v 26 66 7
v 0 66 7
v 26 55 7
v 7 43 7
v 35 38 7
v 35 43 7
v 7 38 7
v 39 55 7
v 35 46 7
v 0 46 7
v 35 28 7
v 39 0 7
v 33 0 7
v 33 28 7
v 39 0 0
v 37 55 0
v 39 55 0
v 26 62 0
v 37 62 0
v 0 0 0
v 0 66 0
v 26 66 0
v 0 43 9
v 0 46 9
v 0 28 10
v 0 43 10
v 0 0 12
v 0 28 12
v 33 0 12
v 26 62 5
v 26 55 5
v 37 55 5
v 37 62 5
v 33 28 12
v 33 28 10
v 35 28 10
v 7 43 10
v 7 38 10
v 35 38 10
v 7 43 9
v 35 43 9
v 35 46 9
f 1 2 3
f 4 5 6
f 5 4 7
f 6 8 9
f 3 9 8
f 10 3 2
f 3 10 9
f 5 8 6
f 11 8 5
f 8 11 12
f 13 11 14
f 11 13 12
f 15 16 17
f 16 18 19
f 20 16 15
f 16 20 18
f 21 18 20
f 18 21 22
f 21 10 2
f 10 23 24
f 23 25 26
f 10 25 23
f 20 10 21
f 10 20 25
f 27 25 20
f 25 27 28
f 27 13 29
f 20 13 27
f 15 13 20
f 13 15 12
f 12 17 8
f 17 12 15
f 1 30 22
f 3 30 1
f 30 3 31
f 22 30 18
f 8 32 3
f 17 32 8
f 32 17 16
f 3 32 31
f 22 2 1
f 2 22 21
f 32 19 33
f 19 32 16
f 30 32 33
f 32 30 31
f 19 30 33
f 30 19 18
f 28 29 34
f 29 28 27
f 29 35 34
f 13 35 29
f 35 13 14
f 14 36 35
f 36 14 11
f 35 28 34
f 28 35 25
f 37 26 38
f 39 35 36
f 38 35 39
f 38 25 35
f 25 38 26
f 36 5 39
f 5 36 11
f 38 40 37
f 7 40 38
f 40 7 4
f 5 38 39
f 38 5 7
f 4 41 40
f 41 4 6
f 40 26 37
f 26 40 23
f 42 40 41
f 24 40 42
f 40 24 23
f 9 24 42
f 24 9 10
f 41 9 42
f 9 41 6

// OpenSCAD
translate([6.5, 5.5, 3.5]) color([0.13558077637136434, 0.20650423900368708, 0.9151210693627757]) cube([13, 11, 7], center=true);
translate([19.5, 5.5, 3.5]) color([0.49673738754911745, 0.7672539256192649, 0.969306850533619]) cube([13, 11, 7], center=true);
translate([32.5, 5.5, 3.5]) color([0.23531586477578126, 0.13212860983739783, 0.23368957459901674]) cube([13, 11, 7], center=true);
translate([6.5, 16.5, 3.5]) color([0.38460662479298113, 0.6084990843462054, 0.1325407149567407]) cube([13, 11, 7], center=true);
translate([19.5, 16.5, 3.5]) color([0.4984659545183915, 0.9178662904203972, 0.6160167741323543]) cube([13, 11, 7], center=true);
translate([32.5, 16.5, 3.5]) color([0.02601445858505036, 0.596125612844632, 0.48919913512172475]) cube([13, 11, 7], center=true);
translate([6.5, 27.5, 3.5]) color([0.30869925031539414, 0.9586301909392594, 0.5555224541780607]) cube([13, 11, 7], center=true);
translate([19.5, 27.5, 3.5]) color([0.16303723797834868, 0.8790785483620981, 0.8092366229990562]) cube([13, 11, 7], center=true);
translate([32.5, 27.5, 3.5]) color([0.7373715302416316, 0.5460288399006699, 0.7042240787132147]) cube([13, 11, 7], center=true);
translate([6.5, 38.5, 3.5]) color([0.07877233817546292, 0.13744427713979768, 0.40185422229333856]) cube([13, 11, 7], center=true);
translate([19.5, 38.5, 3.5]) color([0.1910666288561843, 0.31642065037316636, 0.2917281417853558]) cube([13, 11, 7], center=true);
translate([32.5, 38.5, 3.5]) color([0.9437754009602987, 0.20866341172373193, 0.3151573145870893]) cube([13, 11, 7], center=true);
translate([6.5, 49.5, 3.5]) color([0.7470721078045024, 0.24960896628473228, 0.8629627260654799]) cube([13, 11, 7], center=true);
translate([19.5, 49.5, 3.5]) color([0.6684326881602258, 0.6597695027130189, 0.22591717735012307]) cube([13, 11, 7], center=true);
translate([32.5, 49.5, 3.5]) color([0.3441717078654829, 0.16233220178561225, 0.01697652307419406]) cube([13, 11, 7], center=true);
translate([6.5, 60.5, 3.5]) color([0.5735931064152219, 0.05818297514553228, 0.6304378073753134]) cube([13, 11, 7], center=true);
translate([19.5, 60.5, 3.5]) color([0.35341956482818127, 0.49110709598533775, 0.06132304686728618]) cube([13, 11, 7], center=true);
translate([31.5, 58.5, 2.5]) color([0.24146702174069912, 0.012441234482642782, 0.9455344576677447]) cube([11, 7, 5], center=true);
translate([5.5, 3.5, 9.5]) color([0.3266678829978785, 0.820956849026723, 0.34492851027915805]) cube([11, 7, 5], center=true);
translate([16.5, 3.5, 9.5]) color([0.6639756368298299, 0.13585073420724958, 0.9219835342207869]) cube([11, 7, 5], center=true);
translate([27.5, 3.5, 9.5]) color([0.44896684911260887, 0.1420549627992148, 0.3119518323014343]) cube([11, 7, 5], center=true);
translate([5.5, 10.5, 9.5]) color([0.6490756968320398, 0.7280642389267371, 0.7852833252199665]) cube([11, 7, 5], center=true);
translate([16.5, 10.5, 9.5]) color([0.40863068686923587, 0.009633238682779877, 0.8909238596539266]) cube([11, 7, 5], center=true);
translate([27.5, 10.5, 9.5]) color([0.533705581213062, 0.8046005274030336, 0.9806276909012095]) cube([11, 7, 5], center=true);
translate([5.5, 17.5, 9.5]) color([0.7049346898693578, 0.7590860206033218, 0.5647284680717275]) cube([11, 7, 5], center=true);
translate([16.5, 17.5, 9.5]) color([0.12259546226958773, 0.9539533584587191, 0.1713156178825357]) cube([11, 7, 5], center=true);
translate([27.5, 17.5, 9.5]) color([0.5005542720722199, 0.621843985236089, 0.6619765424276485]) cube([11, 7, 5], center=true);
translate([5.5, 24.5, 9.5]) color([0.8400519693824264, 0.699601591737329, 0.07964741684534404]) cube([11, 7, 5], center=true);
translate([16.5, 24.5, 9.5]) color([0.23738047361475634, 0.8282556520451495, 0.1762738246231843]) cube([11, 7, 5], center=true);
translate([27.5, 24.5, 9.5]) color([0.9459581227747745, 0.9565644324307663, 0.8963269305888116]) cube([11, 7, 5], center=true);
translate([3.5, 30.5, 8.5]) color([0.7428117304122551, 0.8383436924491765, 0.5614087817692366]) cube([7, 5, 3], center=true);
translate([10.5, 30.5, 8.5]) color([0.7177928021437573, 0.4271772721979724, 0.8646648421725511]) cube([7, 5, 3], center=true);
translate([17.5, 30.5, 8.5]) color([0.10365846470378459, 0.6285317276232824, 0.7101075213407797]) cube([7, 5, 3], center=true);
translate([24.5, 30.5, 8.5]) color([0.6149371087697887, 0.0400488022899097, 0.34025031183581533]) cube([7, 5, 3], center=true);
translate([31.5, 30.5, 8.5]) color([0.7380159626358669, 0.3765176313166855, 0.6257641682954356]) cube([7, 5, 3], center=true);
translate([3.5, 35.5, 8.5]) color([0.8894786539399329, 0.4963449395419606, 0.3583651728386771]) cube([7, 5, 3], center=true);
translate([10.5, 35.5, 8.5]) color([0.6716454412848432, 0.45811681625355094, 0.5074379917667022]) cube([7, 5, 3], center=true);
translate([17.5, 35.5, 8.5]) color([0.16228475224599026, 0.7529781863444399, 0.3376457636791449]) cube([7, 5, 3], center=true);
translate([24.5, 35.5, 8.5]) color([0.8033239356600728, 0.9444207727357242, 0.014783921172948133]) cube([7, 5, 3], center=true);
translate([31.5, 35.5, 8.5]) color([0.5303420268039528, 0.2882277186993394, 0.4689175335863792]) cube([7, 5, 3], center=true);
translate([3.5, 40.5, 8.5]) color([0.03492832759702502, 0.5317931441254861, 0.552095437515129]) cube([7, 5, 3], center=true);
translate([2.5, 44.5, 8.0]) color([0.9340898594770107, 0.03830085289416996, 0.3950652682884612]) cube([5, 3, 2], center=true);
translate([7.5, 44.5, 8.0]) color([0.1200155720396251, 0.34658884626630715, 0.051152415727703016]) cube([5, 3, 2], center=true);
translate([12.5, 44.5, 8.0]) color([0.2730496953424699, 0.9956802504828091, 0.25391998649183944]) cube([5, 3, 2], center=true);
translate([17.5, 44.5, 8.0]) color([0.6803935586065328, 0.7027090324157298, 0.9291230685247301]) cube([5, 3, 2], center=true);
translate([22.5, 44.5, 8.0]) color([0.9949404722907454, 0.7620813713006523, 0.7625973189567923]) cube([5, 3, 2], center=true);
translate([27.5, 44.5, 8.0]) color([0.5162610213479427, 0.3860717563215982, 0.8343975914408754]) cube([5, 3, 2], center=true);
translate([32.5, 44.5, 8.0]) color([0.2506337702942619, 0.11599539642064438, 0.9817240858781537]) cube([5, 3, 2], center=true);
